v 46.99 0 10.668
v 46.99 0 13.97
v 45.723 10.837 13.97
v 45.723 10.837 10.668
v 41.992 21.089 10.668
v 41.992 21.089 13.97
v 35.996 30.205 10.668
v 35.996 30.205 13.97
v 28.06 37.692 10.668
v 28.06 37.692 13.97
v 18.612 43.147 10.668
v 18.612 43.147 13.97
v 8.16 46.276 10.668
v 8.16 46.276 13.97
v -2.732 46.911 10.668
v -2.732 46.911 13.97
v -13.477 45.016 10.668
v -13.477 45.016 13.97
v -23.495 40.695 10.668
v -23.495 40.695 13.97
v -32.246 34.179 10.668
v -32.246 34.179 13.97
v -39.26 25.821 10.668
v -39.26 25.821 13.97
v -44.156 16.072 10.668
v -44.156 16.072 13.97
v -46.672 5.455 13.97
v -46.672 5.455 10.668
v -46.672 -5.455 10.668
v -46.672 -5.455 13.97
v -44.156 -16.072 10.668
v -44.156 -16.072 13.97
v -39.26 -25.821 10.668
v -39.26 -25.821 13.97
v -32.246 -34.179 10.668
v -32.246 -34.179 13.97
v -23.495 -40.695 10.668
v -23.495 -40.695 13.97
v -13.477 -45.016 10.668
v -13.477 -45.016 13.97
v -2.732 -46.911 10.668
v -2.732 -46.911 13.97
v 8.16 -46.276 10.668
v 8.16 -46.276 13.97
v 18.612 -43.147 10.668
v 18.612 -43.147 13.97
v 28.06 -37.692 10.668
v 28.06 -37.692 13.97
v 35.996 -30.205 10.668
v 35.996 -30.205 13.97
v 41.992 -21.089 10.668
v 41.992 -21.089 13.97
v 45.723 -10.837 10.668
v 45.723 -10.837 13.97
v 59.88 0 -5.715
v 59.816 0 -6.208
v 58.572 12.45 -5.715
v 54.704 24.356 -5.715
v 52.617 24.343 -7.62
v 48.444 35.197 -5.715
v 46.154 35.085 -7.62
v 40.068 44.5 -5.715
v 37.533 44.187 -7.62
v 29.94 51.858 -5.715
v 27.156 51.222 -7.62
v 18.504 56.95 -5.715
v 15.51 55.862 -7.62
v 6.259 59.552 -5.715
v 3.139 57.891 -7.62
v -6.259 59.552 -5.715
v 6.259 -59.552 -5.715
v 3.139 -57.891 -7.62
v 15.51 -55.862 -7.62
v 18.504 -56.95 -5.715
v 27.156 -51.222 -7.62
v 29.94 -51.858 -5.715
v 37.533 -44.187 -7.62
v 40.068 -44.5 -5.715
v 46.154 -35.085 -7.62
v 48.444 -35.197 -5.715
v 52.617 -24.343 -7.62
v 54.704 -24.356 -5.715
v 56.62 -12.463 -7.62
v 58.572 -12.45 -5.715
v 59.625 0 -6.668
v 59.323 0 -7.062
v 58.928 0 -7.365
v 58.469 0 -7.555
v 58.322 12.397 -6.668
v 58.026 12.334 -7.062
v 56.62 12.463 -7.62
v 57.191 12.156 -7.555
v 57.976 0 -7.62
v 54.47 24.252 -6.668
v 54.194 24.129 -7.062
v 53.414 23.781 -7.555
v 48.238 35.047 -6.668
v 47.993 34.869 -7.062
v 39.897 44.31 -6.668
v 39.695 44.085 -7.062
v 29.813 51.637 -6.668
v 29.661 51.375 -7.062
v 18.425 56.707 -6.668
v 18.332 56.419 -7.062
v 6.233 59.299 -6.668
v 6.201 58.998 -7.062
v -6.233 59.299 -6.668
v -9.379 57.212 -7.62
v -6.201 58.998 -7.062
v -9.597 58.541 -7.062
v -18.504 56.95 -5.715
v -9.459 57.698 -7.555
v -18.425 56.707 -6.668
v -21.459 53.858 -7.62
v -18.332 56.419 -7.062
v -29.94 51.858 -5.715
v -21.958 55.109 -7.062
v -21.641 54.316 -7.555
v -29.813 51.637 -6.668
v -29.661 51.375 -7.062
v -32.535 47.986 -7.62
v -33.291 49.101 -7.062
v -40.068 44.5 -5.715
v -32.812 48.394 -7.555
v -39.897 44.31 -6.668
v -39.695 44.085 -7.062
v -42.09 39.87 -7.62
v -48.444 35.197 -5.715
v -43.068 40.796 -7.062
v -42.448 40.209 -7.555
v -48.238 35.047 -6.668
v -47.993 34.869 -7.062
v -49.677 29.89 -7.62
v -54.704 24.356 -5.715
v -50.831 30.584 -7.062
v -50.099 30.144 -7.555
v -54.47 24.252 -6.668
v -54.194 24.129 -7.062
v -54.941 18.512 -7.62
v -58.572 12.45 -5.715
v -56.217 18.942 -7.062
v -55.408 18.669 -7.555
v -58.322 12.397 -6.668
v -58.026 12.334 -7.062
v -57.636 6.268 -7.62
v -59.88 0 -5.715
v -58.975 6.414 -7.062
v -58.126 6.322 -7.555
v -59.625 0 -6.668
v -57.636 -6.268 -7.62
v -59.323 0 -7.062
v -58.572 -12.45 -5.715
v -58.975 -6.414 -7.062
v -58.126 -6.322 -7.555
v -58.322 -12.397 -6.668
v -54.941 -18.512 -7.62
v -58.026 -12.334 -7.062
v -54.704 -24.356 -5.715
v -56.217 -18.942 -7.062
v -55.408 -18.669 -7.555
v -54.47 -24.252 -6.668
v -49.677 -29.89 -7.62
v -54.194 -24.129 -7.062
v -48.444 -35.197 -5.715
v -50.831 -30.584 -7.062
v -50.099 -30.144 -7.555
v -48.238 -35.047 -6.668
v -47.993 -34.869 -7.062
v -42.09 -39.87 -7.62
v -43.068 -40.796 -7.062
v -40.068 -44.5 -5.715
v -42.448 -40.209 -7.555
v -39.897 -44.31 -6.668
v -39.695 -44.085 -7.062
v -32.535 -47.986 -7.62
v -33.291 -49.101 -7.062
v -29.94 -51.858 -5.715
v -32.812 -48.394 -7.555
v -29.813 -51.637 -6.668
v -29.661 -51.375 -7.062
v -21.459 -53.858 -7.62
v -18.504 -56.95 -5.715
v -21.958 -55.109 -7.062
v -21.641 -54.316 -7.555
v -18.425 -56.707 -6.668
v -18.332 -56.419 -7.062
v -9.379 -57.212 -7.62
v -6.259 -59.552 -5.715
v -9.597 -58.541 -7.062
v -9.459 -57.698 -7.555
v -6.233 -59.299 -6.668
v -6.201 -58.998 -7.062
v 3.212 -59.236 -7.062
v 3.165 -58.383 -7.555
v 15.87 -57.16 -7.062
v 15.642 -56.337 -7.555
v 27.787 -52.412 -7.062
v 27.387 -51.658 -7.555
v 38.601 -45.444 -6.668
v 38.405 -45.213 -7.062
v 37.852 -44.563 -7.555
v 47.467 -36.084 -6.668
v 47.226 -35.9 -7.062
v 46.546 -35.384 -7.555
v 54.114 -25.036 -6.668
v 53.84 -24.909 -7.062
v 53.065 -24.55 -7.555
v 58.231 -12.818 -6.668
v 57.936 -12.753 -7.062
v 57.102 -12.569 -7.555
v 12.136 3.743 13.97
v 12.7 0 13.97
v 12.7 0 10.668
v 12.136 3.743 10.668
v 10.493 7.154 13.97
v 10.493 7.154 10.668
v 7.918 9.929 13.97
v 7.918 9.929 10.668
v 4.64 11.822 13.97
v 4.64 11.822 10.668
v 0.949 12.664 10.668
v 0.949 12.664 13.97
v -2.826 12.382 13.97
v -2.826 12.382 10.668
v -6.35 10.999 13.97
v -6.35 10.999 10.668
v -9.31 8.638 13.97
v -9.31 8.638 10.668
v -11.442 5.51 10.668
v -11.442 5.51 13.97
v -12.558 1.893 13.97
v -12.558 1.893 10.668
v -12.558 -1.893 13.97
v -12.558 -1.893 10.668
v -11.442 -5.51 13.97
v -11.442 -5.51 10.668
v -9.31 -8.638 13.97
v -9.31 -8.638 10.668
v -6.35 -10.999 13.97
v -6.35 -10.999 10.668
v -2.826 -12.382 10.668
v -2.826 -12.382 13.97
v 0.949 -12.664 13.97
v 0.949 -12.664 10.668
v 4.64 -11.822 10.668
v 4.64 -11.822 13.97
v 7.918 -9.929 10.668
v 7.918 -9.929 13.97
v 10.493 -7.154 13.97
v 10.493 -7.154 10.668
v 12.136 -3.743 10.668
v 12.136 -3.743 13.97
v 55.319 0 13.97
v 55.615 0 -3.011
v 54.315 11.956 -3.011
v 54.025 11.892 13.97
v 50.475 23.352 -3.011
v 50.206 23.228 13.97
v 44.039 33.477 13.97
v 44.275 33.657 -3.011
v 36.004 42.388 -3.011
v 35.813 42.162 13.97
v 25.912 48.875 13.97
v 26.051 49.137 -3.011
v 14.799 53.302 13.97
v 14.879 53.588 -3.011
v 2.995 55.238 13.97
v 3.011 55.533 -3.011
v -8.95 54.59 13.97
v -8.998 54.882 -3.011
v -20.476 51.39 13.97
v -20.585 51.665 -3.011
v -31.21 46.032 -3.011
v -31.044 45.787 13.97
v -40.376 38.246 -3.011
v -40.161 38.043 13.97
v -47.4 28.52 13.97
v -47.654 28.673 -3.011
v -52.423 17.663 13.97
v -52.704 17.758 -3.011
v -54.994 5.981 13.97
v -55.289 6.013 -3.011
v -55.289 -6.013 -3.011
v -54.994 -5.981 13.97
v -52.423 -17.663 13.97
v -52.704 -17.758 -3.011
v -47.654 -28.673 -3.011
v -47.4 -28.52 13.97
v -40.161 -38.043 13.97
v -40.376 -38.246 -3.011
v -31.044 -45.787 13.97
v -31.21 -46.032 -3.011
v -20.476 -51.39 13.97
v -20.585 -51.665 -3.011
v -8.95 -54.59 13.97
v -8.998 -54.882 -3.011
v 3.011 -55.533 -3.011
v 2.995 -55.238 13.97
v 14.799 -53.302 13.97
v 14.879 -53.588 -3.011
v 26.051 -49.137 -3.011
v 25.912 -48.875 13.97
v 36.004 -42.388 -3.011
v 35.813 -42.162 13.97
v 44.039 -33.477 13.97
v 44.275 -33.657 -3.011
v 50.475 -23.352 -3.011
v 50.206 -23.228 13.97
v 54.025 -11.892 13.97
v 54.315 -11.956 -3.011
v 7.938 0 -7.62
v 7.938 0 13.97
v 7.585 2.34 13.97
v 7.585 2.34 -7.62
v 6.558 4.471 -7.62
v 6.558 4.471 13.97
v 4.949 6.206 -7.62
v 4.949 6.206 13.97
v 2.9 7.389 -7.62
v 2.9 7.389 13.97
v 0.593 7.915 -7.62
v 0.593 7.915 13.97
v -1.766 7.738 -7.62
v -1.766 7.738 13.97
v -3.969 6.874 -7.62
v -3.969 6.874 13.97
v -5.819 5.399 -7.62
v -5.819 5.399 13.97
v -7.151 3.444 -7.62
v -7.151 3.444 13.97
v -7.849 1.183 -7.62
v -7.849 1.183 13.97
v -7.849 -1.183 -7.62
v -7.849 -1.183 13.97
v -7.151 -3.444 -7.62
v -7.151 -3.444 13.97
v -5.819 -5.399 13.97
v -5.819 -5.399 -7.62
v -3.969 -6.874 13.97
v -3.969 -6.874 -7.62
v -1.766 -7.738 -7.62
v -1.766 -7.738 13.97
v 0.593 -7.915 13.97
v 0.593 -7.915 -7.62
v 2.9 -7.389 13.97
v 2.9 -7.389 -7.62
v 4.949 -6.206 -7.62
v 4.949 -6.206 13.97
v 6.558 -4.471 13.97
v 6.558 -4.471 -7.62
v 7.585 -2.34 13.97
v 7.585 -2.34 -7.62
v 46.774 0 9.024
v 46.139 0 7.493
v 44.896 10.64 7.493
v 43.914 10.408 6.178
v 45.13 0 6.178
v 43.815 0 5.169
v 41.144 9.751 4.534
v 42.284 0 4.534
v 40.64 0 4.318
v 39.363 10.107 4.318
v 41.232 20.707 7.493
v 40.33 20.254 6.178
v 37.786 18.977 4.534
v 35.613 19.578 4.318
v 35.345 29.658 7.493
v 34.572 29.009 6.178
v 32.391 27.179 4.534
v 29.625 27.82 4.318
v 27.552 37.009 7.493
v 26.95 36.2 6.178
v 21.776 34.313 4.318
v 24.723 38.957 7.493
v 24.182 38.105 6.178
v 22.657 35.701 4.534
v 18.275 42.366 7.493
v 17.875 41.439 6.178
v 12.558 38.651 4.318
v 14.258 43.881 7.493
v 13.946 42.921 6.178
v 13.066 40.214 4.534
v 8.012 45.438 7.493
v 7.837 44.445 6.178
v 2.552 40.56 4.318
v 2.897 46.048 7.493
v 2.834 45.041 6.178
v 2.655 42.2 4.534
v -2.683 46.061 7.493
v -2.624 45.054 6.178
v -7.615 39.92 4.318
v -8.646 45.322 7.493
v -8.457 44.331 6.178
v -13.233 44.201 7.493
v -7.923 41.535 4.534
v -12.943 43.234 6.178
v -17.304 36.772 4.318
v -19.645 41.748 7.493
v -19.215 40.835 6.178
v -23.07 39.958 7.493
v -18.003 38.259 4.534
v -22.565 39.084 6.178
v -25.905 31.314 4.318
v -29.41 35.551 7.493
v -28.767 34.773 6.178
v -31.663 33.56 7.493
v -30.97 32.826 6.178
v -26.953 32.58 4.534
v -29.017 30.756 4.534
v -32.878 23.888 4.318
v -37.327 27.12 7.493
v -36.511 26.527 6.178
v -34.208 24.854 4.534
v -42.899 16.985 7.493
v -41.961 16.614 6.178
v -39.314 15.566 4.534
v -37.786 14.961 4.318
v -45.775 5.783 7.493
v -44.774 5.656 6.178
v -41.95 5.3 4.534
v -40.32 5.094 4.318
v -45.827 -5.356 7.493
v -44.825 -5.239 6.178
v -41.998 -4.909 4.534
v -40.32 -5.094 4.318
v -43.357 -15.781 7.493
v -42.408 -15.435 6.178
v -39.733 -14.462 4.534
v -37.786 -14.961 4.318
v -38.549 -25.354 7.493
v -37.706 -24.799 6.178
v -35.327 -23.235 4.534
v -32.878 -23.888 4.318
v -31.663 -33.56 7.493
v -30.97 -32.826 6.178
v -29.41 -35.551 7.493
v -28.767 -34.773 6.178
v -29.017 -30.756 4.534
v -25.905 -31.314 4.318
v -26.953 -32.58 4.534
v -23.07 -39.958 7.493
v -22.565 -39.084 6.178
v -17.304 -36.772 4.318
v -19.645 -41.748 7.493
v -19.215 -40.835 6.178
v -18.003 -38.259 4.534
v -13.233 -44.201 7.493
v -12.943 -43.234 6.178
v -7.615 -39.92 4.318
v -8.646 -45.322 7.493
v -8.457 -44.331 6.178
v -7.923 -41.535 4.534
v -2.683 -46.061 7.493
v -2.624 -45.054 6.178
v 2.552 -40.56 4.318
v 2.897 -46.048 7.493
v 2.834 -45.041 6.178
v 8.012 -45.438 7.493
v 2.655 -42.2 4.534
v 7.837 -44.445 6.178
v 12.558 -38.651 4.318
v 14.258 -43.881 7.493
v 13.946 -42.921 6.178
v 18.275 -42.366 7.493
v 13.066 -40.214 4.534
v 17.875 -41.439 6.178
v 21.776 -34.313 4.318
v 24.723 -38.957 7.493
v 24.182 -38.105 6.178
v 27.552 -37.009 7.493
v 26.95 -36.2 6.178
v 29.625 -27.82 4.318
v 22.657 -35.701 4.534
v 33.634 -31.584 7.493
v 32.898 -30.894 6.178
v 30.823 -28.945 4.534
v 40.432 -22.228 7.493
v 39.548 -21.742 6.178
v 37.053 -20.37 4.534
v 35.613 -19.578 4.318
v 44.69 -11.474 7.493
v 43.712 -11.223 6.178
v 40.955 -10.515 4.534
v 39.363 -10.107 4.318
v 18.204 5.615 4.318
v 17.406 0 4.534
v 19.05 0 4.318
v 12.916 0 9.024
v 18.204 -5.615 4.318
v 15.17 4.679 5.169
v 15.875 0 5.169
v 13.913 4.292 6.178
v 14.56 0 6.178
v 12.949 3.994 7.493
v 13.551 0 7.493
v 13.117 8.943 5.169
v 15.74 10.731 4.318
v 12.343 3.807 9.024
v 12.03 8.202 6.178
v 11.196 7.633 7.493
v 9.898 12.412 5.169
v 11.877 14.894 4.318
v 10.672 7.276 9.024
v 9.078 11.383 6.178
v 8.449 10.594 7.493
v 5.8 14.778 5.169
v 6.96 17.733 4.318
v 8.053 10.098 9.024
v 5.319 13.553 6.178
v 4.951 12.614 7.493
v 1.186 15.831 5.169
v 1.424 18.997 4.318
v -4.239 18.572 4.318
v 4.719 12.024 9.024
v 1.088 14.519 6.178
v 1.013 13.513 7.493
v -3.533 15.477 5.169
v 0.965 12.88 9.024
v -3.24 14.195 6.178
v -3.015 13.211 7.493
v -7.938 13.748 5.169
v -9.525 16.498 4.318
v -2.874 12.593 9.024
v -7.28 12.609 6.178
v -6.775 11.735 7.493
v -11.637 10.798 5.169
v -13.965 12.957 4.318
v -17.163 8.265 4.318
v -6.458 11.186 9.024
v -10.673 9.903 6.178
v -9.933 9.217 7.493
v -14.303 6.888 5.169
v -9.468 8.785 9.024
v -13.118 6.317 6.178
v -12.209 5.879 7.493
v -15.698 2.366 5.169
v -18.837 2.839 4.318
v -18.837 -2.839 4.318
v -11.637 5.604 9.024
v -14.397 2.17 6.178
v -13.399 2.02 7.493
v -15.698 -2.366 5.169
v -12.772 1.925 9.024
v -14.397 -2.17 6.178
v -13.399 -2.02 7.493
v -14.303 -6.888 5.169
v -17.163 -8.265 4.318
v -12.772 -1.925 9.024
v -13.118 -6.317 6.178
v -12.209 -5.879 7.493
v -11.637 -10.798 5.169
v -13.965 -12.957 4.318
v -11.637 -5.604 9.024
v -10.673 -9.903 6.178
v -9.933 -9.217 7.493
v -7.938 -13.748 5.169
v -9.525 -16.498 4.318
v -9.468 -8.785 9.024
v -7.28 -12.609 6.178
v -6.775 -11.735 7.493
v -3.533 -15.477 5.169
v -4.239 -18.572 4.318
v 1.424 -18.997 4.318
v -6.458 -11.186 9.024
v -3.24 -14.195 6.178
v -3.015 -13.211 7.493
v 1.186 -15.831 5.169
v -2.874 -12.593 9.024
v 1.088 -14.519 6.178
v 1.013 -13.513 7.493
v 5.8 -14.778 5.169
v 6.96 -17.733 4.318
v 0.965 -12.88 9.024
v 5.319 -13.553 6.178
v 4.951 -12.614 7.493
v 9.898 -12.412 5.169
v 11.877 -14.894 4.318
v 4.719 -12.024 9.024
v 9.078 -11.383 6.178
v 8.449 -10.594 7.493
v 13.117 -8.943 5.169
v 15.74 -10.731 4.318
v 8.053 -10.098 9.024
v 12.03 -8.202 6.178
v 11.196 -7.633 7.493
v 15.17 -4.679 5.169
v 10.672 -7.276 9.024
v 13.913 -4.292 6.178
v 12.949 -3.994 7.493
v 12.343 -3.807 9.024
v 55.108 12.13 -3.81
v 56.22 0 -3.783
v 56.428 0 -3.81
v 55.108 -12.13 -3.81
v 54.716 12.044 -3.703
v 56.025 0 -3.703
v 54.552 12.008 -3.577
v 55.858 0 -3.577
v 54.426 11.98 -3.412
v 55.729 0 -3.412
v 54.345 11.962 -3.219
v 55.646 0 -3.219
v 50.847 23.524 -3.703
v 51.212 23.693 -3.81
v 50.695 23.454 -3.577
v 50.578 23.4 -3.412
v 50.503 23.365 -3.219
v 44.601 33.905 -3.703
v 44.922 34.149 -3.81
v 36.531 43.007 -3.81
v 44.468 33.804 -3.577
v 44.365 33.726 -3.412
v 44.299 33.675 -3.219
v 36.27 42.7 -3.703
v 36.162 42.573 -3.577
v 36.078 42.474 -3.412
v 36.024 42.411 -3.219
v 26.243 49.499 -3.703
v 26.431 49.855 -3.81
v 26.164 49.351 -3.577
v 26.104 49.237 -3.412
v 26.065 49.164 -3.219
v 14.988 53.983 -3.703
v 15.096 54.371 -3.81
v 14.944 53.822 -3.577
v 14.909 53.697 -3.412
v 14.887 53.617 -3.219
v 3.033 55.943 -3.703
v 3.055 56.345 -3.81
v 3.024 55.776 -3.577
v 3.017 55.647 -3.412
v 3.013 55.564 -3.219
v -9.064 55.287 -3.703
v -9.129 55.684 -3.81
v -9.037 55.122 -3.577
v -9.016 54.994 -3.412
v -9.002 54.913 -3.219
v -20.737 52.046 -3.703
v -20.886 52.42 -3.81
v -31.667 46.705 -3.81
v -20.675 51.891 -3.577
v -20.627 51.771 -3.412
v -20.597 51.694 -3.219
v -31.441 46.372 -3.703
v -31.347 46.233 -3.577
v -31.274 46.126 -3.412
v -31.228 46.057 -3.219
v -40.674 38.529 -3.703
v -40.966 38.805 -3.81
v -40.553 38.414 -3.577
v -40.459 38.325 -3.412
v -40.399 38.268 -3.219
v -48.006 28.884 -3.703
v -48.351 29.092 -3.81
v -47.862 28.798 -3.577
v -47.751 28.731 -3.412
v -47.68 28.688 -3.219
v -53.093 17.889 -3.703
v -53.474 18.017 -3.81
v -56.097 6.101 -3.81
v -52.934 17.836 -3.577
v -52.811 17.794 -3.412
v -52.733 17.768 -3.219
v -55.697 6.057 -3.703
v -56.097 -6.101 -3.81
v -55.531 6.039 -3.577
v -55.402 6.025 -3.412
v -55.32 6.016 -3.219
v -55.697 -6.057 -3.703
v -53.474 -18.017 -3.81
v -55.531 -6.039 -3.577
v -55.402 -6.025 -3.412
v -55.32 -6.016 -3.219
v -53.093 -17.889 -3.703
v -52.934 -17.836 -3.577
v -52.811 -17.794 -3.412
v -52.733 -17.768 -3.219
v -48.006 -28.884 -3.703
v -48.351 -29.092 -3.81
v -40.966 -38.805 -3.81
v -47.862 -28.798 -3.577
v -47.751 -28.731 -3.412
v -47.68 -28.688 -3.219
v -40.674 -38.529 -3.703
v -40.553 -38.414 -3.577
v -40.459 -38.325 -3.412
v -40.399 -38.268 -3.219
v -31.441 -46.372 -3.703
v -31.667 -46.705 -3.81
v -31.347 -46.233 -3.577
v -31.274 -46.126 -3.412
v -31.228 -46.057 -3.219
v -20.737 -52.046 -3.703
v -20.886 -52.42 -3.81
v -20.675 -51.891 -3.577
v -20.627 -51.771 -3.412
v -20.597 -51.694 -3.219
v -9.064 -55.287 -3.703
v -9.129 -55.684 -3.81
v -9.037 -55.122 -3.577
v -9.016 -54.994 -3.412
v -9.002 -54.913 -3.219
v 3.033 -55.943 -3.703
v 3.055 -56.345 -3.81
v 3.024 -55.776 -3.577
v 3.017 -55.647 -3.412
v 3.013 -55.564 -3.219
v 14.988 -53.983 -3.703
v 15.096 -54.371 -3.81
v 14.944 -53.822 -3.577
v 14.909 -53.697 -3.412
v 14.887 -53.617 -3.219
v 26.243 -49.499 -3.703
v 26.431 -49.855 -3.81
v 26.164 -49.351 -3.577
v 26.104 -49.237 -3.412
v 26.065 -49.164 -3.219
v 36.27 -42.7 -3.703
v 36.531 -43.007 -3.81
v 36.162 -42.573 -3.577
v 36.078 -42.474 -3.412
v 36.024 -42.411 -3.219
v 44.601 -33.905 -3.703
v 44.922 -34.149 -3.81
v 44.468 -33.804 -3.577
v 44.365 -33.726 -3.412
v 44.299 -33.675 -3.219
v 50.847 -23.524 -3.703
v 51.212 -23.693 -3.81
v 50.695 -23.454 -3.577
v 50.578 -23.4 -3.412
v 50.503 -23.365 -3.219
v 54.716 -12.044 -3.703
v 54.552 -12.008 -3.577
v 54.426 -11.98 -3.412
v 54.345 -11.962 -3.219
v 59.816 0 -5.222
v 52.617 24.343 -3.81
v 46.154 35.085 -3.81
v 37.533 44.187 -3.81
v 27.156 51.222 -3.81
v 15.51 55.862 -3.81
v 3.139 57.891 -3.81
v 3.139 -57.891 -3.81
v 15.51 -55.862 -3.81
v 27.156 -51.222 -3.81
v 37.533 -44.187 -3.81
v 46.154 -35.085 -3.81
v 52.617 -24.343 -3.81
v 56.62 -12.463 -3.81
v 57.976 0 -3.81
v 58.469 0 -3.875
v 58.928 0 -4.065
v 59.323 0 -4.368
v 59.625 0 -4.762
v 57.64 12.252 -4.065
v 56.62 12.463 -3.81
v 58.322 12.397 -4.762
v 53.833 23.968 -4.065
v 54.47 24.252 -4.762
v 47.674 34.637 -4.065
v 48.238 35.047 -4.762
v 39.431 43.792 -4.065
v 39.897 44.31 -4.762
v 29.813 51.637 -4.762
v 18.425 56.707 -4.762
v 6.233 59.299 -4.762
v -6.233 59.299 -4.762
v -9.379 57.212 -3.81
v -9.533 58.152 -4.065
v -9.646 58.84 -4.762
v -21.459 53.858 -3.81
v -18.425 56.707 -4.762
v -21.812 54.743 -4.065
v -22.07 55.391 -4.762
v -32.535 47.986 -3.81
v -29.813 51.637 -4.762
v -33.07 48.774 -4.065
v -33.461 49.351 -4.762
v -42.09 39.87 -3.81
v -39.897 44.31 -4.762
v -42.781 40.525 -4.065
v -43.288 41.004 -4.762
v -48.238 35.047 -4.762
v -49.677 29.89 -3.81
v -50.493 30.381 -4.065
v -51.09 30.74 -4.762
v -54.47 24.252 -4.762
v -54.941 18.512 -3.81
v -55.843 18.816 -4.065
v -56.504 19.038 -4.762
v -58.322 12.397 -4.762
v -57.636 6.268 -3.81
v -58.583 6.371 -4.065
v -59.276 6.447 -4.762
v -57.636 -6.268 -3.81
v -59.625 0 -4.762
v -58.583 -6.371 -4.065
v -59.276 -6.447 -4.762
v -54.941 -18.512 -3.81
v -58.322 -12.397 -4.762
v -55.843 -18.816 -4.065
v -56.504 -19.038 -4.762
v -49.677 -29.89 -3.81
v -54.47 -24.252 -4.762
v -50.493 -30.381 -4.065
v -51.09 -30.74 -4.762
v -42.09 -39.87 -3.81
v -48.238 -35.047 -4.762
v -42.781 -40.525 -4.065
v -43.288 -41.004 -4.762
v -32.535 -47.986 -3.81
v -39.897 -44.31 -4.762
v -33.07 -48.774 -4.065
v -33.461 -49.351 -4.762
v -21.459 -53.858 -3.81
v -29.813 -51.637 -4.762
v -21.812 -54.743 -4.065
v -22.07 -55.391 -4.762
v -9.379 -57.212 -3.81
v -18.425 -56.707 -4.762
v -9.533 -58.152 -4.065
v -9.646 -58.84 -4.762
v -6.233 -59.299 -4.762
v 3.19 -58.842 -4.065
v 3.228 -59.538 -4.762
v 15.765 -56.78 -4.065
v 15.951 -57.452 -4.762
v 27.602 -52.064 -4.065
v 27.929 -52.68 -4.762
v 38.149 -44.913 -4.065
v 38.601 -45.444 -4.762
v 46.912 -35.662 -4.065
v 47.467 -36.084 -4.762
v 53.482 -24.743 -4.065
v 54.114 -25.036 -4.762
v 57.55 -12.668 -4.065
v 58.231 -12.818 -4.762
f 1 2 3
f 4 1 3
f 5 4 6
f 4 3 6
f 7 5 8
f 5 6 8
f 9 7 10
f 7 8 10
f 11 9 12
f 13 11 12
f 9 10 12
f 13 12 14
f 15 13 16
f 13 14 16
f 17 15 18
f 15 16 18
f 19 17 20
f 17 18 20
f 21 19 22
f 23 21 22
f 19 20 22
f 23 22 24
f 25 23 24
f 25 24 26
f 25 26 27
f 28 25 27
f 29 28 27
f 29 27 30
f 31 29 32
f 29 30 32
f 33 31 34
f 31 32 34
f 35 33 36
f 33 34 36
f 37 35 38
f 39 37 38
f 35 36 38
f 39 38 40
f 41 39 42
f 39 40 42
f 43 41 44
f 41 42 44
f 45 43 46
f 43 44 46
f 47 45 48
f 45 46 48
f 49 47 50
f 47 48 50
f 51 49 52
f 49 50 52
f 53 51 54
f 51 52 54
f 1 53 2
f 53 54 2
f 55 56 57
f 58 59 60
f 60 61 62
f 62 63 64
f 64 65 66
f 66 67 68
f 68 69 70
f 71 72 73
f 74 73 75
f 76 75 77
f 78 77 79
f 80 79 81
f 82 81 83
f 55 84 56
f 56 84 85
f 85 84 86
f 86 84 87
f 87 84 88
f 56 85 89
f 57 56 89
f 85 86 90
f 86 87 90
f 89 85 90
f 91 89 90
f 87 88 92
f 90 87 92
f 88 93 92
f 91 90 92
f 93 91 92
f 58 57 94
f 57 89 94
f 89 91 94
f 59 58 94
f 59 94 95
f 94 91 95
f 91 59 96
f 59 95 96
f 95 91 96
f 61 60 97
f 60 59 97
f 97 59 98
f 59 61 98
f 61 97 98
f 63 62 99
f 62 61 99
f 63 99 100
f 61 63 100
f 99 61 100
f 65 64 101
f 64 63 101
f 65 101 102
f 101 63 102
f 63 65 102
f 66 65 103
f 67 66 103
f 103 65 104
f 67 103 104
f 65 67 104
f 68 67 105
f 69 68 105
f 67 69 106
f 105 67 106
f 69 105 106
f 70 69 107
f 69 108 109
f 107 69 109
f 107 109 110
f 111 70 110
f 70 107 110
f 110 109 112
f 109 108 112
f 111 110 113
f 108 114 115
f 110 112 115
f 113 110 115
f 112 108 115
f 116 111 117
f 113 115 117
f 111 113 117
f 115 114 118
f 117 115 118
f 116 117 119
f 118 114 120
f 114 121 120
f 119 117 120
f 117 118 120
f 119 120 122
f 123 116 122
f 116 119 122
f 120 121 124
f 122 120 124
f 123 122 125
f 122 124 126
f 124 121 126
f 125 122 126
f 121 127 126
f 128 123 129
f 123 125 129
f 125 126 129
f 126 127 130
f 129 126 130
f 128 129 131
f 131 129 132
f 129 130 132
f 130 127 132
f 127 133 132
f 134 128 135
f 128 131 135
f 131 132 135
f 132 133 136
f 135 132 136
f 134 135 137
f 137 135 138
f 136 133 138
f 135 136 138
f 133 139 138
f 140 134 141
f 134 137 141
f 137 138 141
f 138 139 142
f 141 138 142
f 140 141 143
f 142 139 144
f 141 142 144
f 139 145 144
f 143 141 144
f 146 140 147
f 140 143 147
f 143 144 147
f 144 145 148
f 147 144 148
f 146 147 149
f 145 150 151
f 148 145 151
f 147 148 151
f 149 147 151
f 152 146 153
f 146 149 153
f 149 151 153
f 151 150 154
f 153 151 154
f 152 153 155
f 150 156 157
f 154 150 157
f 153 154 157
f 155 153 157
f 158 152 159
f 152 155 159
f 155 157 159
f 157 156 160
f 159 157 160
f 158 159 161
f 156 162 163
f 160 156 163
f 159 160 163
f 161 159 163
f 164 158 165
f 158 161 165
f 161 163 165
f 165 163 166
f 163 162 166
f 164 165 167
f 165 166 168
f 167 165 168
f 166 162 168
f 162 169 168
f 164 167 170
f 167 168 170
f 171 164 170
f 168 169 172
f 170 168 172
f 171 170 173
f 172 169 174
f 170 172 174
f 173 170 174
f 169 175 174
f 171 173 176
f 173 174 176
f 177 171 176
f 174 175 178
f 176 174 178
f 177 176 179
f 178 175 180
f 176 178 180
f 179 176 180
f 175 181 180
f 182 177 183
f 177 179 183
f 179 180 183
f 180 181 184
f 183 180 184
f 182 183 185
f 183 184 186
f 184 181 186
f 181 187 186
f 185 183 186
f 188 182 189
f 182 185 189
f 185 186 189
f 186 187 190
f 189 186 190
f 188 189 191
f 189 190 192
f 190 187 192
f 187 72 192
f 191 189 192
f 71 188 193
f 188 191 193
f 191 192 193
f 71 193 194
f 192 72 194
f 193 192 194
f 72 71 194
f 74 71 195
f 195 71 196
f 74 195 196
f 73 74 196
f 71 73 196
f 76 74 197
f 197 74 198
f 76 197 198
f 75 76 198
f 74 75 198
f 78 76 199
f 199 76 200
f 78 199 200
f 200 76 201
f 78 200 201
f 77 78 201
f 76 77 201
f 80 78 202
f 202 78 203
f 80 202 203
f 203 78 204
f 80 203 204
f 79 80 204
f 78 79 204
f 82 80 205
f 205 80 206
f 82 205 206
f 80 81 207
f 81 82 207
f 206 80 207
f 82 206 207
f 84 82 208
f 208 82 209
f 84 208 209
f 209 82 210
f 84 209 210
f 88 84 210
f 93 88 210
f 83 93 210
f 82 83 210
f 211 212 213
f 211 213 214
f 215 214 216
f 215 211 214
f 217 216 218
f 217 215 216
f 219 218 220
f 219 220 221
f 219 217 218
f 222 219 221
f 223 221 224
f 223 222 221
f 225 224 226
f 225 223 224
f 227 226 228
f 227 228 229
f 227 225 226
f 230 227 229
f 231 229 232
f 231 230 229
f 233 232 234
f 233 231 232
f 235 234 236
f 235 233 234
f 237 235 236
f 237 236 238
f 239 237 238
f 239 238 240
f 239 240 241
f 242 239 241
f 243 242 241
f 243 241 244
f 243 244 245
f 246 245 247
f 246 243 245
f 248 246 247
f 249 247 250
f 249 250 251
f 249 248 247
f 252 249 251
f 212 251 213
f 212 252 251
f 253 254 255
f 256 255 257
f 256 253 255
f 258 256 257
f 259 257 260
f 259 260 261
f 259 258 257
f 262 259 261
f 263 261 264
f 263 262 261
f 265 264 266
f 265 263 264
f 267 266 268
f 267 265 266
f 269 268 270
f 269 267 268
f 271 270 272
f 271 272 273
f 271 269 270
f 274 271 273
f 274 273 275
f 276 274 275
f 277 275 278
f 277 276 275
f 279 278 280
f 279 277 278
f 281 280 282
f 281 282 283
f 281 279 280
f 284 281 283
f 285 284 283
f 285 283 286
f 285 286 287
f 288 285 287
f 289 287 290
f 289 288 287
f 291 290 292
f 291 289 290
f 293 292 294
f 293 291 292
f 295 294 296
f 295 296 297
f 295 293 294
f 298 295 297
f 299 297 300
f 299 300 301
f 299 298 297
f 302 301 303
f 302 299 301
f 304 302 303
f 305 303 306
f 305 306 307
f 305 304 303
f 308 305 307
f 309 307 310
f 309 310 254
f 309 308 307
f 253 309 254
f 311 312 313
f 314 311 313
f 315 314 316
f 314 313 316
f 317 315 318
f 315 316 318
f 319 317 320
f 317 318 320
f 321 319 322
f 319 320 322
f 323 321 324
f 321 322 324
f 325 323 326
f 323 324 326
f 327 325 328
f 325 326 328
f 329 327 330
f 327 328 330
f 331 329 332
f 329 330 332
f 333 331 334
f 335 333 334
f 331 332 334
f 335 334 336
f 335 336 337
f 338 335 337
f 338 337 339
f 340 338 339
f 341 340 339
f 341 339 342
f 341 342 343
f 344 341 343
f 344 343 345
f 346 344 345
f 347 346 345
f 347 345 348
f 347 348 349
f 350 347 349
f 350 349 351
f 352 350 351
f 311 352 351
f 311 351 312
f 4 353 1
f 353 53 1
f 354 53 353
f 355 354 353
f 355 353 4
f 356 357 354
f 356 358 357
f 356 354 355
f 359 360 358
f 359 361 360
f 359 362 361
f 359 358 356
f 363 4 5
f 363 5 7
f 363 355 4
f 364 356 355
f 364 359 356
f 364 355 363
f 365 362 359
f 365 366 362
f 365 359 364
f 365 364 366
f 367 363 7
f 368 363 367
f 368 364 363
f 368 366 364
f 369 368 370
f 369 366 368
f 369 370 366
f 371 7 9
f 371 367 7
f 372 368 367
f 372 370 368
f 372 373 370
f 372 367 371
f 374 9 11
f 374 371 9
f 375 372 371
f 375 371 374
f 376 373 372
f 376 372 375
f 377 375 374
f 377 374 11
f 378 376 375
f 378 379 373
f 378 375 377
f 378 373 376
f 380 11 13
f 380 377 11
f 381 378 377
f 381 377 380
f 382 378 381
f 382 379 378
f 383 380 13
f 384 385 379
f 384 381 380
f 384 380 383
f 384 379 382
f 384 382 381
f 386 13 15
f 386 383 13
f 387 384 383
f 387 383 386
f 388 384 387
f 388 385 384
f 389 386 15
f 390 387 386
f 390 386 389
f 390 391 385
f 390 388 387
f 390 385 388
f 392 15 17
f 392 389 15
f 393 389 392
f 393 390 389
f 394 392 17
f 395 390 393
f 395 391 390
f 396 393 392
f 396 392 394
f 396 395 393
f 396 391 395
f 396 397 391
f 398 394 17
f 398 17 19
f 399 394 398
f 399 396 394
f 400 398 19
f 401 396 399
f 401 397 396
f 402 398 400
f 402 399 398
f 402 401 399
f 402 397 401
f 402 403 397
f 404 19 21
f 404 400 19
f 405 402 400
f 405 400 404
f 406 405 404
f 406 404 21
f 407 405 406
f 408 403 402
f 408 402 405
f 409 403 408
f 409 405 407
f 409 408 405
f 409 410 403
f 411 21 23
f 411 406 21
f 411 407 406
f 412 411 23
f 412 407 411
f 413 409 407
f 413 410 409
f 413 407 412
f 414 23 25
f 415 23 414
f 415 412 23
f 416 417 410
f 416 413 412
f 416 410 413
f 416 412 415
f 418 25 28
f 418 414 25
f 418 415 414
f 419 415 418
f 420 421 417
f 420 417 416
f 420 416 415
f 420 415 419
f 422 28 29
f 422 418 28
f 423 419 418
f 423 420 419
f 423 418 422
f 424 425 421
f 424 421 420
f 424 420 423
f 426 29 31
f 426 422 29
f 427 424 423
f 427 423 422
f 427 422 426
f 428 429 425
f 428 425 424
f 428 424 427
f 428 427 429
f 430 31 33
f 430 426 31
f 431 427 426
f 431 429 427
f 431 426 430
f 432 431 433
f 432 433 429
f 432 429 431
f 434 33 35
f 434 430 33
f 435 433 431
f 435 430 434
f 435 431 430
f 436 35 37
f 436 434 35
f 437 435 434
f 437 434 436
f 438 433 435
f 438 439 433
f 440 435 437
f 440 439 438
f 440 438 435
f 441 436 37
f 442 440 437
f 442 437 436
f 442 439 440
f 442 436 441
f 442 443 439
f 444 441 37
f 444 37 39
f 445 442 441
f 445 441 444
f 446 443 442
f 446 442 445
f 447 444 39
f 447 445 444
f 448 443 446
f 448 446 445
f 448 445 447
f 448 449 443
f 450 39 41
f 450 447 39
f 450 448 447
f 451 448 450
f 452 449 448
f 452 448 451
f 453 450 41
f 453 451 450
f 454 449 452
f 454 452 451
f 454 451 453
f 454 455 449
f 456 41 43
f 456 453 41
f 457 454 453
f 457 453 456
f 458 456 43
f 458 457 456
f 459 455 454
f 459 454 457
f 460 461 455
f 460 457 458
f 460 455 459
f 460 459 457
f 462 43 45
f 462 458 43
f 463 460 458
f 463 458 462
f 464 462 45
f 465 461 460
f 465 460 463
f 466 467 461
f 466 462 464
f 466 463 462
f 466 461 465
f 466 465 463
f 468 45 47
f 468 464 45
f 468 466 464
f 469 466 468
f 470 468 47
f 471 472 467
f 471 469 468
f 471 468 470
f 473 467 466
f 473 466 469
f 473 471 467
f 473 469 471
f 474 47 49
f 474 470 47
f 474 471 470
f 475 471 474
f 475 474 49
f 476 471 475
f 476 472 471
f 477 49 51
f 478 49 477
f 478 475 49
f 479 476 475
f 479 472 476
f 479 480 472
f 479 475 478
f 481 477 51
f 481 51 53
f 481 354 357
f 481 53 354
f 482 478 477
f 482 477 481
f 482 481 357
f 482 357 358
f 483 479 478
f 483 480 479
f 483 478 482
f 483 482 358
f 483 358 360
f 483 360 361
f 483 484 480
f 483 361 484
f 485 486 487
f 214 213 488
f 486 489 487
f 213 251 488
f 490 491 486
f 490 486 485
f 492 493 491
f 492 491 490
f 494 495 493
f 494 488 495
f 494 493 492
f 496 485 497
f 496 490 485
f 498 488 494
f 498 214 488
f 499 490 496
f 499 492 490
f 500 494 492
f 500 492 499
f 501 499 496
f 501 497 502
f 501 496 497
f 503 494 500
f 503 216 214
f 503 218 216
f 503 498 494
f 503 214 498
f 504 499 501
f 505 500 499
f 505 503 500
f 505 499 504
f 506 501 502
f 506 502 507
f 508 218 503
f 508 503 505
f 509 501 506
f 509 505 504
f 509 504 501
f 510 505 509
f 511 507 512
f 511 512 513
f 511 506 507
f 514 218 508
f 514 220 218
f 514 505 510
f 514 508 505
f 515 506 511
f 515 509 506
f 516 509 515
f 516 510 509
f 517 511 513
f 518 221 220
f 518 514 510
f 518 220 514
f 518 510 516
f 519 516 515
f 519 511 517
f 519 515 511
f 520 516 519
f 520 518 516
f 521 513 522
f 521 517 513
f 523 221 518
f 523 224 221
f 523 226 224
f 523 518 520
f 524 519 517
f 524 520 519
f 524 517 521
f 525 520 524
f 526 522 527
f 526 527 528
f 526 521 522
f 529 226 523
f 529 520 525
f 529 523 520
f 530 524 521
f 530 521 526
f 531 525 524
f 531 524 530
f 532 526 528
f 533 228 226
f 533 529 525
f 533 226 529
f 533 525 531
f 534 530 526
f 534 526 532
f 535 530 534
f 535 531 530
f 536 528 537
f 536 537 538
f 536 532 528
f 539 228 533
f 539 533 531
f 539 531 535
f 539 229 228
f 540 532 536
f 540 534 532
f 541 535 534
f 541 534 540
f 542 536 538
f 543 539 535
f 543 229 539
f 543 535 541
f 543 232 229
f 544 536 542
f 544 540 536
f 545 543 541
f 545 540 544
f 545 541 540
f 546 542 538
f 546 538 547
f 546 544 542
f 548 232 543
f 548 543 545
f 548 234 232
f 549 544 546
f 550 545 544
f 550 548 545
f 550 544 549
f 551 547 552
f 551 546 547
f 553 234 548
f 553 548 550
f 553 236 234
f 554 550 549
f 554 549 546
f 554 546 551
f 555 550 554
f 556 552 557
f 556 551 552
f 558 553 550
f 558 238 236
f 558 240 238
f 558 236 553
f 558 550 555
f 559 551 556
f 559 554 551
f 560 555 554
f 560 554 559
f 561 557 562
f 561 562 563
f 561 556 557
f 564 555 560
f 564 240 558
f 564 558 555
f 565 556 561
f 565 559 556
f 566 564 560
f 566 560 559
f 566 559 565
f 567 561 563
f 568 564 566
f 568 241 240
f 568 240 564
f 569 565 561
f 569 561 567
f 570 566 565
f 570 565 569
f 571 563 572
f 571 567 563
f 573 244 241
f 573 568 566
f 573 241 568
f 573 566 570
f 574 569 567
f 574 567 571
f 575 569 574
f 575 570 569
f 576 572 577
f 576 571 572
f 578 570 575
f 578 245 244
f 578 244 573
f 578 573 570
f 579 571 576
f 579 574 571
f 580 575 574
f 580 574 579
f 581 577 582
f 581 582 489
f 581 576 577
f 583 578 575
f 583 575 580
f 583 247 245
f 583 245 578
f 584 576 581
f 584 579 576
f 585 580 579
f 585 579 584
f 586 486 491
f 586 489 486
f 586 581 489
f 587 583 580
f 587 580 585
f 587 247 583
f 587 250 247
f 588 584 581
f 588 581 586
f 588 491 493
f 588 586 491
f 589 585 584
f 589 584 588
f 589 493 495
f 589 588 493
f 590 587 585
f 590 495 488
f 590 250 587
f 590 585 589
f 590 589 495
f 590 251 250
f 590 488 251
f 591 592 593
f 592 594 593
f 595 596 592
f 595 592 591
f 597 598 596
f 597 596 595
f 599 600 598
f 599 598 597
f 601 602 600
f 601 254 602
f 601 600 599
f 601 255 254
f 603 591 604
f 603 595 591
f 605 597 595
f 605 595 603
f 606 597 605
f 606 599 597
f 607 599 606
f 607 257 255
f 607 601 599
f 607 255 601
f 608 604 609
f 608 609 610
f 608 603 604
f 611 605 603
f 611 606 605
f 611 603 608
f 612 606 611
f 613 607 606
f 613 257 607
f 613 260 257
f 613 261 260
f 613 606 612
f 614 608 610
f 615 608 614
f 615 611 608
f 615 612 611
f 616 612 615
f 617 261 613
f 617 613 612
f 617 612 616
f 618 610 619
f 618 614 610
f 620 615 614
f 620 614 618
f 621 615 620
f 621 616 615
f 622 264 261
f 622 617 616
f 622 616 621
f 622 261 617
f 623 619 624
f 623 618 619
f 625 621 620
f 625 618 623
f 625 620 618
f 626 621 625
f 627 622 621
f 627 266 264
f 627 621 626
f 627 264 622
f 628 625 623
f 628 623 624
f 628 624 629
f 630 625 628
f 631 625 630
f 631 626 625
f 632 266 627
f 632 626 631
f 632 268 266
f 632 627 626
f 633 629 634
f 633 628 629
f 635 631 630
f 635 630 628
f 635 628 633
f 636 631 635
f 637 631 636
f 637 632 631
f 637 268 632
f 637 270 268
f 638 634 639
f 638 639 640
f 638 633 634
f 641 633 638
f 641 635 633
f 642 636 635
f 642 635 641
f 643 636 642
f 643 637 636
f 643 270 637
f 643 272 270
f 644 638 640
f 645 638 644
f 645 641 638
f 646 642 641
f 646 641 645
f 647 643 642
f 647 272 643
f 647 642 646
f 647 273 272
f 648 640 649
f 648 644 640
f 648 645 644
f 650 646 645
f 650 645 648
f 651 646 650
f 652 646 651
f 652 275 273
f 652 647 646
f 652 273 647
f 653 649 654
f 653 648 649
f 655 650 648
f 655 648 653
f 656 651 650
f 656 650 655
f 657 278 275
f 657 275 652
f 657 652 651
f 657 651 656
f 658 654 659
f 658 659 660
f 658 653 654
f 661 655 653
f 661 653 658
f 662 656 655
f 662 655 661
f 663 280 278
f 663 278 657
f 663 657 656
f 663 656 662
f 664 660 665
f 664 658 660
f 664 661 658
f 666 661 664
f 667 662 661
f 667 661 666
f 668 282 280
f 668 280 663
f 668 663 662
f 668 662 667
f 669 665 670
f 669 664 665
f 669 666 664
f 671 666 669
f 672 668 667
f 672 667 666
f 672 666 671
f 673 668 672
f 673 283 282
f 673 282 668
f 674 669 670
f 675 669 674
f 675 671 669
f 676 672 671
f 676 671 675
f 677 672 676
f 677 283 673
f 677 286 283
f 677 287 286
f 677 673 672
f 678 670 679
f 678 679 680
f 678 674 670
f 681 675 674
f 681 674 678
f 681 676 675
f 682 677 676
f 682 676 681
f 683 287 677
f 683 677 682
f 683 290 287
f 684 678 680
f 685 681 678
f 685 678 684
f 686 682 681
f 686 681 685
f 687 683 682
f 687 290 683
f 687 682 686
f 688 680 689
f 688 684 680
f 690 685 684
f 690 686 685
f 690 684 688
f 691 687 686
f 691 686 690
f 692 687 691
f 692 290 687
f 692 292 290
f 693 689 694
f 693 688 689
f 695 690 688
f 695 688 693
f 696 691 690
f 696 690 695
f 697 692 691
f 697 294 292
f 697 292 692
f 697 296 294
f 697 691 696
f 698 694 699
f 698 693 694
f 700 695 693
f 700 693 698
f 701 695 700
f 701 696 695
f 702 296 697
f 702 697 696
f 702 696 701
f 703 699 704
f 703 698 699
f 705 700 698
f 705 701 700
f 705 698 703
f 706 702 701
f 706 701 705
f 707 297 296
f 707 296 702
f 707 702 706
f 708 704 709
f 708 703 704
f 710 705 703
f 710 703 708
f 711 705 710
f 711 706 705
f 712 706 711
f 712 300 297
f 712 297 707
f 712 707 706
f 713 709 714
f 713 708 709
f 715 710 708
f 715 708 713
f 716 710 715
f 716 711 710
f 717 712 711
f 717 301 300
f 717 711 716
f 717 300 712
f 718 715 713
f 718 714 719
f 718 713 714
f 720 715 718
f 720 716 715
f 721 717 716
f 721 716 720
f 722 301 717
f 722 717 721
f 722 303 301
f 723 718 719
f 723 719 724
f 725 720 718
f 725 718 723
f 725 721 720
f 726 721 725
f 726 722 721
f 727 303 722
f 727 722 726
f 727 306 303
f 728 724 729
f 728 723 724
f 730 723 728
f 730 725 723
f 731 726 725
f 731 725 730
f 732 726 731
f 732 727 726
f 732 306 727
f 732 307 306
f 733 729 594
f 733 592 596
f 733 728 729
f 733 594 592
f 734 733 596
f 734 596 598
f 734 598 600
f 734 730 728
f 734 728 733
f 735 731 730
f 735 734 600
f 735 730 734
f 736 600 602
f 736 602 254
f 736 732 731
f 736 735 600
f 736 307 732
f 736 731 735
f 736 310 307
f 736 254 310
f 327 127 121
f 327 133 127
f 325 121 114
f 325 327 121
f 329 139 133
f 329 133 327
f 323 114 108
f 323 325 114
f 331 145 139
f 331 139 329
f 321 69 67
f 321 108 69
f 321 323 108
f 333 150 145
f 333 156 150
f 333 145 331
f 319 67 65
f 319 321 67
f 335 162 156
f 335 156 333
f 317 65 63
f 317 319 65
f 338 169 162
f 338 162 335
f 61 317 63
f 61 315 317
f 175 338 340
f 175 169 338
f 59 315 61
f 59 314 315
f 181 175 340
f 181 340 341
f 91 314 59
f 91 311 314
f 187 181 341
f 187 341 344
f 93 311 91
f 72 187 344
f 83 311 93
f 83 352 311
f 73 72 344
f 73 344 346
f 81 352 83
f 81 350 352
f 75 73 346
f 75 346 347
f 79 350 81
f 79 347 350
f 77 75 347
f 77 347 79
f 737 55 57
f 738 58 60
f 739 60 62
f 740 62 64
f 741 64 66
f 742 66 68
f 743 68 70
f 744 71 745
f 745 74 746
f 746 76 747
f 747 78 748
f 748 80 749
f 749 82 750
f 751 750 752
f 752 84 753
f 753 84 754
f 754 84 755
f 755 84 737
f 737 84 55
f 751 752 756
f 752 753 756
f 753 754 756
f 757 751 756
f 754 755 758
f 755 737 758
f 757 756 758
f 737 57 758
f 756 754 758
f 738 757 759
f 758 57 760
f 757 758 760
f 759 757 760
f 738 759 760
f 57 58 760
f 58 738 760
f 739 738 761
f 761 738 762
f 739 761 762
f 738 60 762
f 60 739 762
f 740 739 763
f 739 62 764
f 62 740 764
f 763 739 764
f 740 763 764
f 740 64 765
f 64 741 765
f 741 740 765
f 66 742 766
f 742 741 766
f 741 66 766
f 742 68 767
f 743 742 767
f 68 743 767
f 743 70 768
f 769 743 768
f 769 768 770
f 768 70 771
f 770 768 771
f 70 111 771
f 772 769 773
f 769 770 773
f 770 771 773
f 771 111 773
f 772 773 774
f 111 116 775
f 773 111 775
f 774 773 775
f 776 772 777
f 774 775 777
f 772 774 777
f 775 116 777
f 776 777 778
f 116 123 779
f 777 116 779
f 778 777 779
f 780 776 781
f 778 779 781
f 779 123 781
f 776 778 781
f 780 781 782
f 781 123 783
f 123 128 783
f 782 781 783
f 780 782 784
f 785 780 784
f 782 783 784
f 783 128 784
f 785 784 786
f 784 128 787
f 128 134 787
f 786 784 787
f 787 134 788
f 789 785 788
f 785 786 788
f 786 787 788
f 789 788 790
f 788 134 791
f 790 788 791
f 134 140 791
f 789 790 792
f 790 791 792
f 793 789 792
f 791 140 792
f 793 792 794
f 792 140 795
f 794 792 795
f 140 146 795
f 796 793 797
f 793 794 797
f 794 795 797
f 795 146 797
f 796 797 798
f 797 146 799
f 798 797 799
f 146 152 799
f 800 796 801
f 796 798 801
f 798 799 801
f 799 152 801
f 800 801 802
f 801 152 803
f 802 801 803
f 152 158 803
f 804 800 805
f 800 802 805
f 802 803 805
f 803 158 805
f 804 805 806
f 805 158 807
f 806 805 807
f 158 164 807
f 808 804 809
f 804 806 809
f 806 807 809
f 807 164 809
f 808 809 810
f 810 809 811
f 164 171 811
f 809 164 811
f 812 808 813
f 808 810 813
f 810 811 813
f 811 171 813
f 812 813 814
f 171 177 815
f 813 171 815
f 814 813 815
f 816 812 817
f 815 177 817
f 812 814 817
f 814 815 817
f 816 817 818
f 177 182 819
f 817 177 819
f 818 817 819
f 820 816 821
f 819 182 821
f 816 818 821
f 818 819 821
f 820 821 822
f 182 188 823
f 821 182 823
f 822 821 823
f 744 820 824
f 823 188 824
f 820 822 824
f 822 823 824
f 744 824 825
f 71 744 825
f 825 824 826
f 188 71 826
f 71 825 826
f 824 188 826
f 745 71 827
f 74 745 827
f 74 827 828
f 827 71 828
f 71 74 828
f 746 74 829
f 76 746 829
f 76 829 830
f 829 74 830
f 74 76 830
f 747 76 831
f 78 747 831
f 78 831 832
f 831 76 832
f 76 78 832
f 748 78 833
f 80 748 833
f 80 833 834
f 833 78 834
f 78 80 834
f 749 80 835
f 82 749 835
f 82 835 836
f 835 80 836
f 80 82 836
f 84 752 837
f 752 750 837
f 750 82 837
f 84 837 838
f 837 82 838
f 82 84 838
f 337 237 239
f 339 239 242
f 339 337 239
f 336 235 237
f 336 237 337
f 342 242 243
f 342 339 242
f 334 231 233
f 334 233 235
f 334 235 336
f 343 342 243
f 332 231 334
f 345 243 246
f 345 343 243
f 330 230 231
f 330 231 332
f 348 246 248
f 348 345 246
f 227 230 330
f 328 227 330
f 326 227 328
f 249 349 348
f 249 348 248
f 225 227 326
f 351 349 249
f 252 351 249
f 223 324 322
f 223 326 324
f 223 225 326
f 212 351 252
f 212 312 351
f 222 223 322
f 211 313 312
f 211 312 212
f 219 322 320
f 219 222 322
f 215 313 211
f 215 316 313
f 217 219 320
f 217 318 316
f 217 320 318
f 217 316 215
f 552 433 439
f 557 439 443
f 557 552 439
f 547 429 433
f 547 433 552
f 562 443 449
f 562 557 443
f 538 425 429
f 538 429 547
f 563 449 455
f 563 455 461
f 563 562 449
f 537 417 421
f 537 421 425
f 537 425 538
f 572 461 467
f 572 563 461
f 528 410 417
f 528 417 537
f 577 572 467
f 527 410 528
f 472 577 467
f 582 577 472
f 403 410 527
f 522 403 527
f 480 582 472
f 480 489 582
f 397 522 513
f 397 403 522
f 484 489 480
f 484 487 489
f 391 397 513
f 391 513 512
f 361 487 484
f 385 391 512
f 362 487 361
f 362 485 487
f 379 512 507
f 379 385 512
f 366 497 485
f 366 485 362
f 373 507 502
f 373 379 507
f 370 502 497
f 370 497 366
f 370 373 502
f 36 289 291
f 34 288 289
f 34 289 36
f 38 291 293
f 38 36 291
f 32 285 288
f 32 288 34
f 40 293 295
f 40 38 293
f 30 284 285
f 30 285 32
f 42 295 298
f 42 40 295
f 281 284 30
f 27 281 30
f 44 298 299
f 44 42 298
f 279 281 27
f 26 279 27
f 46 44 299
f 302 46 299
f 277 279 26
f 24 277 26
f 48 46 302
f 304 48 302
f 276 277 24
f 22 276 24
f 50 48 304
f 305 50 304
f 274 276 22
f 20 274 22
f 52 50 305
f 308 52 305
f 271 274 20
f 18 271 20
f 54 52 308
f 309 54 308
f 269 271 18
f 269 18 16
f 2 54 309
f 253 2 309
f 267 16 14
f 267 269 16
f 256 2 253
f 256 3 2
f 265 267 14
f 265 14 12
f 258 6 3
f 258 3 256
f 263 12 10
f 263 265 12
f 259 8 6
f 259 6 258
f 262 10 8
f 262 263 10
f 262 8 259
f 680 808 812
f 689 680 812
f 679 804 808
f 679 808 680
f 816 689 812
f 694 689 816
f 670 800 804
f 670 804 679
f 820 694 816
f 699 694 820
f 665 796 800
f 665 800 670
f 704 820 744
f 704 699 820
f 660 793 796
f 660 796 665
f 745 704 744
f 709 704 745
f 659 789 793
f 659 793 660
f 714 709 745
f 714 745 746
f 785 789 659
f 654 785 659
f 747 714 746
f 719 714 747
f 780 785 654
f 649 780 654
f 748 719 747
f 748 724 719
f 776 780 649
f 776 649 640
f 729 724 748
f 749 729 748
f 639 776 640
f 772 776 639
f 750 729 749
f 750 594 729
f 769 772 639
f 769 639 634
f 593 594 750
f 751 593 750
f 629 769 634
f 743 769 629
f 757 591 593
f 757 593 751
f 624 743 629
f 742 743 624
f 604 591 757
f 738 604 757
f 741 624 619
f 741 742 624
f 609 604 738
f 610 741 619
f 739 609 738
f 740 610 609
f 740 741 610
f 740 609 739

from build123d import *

# Parameters (mm, degrees)
SKETCH1_R                   = 58.42
BOSS_EXTRUDE1_DEPTH         = 13.97
SKETCH2_R                   = 46.99
SKETCH2_R_2                 = 12.7
CUT_EXTRUDE1_DEPTH          = 9.652
FILLET1_R                   = 6.35
SKETCH3_R                   = 60.96
BOSS_EXTRUDE2_DEPTH         = 7.62
SKETCH4_R                   = 7.9375
CUT_EXTRUDE2_DEPTH          = 89.872781548
SKETCH5_R                   = 60.96
SKETCH5_R_2                 = 58.42
FLANGEWIDTHMACHINED_DEPTH   = 3.81
SKETCH7_R                   = 58.42
SKETCH7_R_2                 = 55.5625
CUT_EXTRUDE5_DEPTH          = 17.78
SKETCH6_R                   = 60.96
SKETCH6_R_2                 = 59.8805
FLANGE_DEPTH_MACHINED_DEPTH = 89.024835132
DRAFT1_ANGLE                = 1
FILLET2_R                   = 0.8128
FILLET3_R                   = 1.905


with BuildPart() as part:
    # Sketch1 → Boss-Extrude1 (new body)
    with BuildSketch(Plane.XY):
        Circle(SKETCH1_R)
    extrude(amount=BOSS_EXTRUDE1_DEPTH)

    # Sketch2 → Cut-Extrude1 (cut)
    with BuildSketch(Plane.XY.offset(13.97)):
        Circle(SKETCH2_R)
        Circle(SKETCH2_R_2, mode=Mode.SUBTRACT)
    extrude(amount=-CUT_EXTRUDE1_DEPTH, mode=Mode.SUBTRACT)

    # Fillet1
    fillet1_edges = [part.edges().sort_by_distance(p)[0] for p in [
        (-46.99, 0, 4.318),
        (-12.7, 0, 4.318),
    ]]
    fillet(fillet1_edges, radius=FILLET1_R)

    # Sketch3 → Boss-Extrude2 (add)
    with BuildSketch(Plane(origin=(0, 0, 0), x_dir=(-1, 0, 0), z_dir=(0, 0, -1))):
        with Locations(Location((0, 0, 0), (0, 0, 180))):
            Circle(SKETCH3_R)
    extrude(amount=BOSS_EXTRUDE2_DEPTH)

    # Sketch4 → Cut-Extrude2 (cut, through all)
    with BuildSketch(Plane.XY.offset(13.97)):
        Circle(SKETCH4_R)
    extrude(amount=-CUT_EXTRUDE2_DEPTH, mode=Mode.SUBTRACT)

    # Sketch5 → FlangeWidthMachined (cut)
    with BuildSketch(Plane.XY):
        Circle(SKETCH5_R)
        Circle(SKETCH5_R_2, mode=Mode.SUBTRACT)
    extrude(amount=-FLANGEWIDTHMACHINED_DEPTH, mode=Mode.SUBTRACT)

    # Sketch7 → Cut-Extrude5 (cut)
    with BuildSketch(Plane.XY.offset(13.97)):
        Circle(SKETCH7_R)
        Circle(SKETCH7_R_2, mode=Mode.SUBTRACT)
    extrude(amount=-CUT_EXTRUDE5_DEPTH, mode=Mode.SUBTRACT)

    # Sketch6 → Flange Depth Machined (cut, through all)
    with BuildSketch(Plane.XY.offset(-3.81)):
        Circle(SKETCH6_R)
        Circle(SKETCH6_R_2, mode=Mode.SUBTRACT)
    extrude(amount=-FLANGE_DEPTH_MACHINED_DEPTH, mode=Mode.SUBTRACT)

    # Draft1
    draft1_faces = [part.faces().sort_by_distance(p)[0] for p in [
        (-55.5625, 0, 5.08),
    ]]
    draft(draft1_faces, Plane.XY, DRAFT1_ANGLE)

    # Fillet2
    fillet2_edges = [part.edges().sort_by_distance(p)[0] for p in [
        (-55.629003797, 0, -3.81),
    ]]
    fillet(fillet2_edges, radius=FILLET2_R)

    # Fillet3
    fillet3_edges = [part.edges().sort_by_distance(p)[0] for p in [
        (-59.8805, 0, -7.62),
        (-59.8805, 0, -3.81),
    ]]
    fillet(fillet3_edges, radius=FILLET3_R - 0.0001)  # a hair under: the kernel refuses the full size


solid = part.part
